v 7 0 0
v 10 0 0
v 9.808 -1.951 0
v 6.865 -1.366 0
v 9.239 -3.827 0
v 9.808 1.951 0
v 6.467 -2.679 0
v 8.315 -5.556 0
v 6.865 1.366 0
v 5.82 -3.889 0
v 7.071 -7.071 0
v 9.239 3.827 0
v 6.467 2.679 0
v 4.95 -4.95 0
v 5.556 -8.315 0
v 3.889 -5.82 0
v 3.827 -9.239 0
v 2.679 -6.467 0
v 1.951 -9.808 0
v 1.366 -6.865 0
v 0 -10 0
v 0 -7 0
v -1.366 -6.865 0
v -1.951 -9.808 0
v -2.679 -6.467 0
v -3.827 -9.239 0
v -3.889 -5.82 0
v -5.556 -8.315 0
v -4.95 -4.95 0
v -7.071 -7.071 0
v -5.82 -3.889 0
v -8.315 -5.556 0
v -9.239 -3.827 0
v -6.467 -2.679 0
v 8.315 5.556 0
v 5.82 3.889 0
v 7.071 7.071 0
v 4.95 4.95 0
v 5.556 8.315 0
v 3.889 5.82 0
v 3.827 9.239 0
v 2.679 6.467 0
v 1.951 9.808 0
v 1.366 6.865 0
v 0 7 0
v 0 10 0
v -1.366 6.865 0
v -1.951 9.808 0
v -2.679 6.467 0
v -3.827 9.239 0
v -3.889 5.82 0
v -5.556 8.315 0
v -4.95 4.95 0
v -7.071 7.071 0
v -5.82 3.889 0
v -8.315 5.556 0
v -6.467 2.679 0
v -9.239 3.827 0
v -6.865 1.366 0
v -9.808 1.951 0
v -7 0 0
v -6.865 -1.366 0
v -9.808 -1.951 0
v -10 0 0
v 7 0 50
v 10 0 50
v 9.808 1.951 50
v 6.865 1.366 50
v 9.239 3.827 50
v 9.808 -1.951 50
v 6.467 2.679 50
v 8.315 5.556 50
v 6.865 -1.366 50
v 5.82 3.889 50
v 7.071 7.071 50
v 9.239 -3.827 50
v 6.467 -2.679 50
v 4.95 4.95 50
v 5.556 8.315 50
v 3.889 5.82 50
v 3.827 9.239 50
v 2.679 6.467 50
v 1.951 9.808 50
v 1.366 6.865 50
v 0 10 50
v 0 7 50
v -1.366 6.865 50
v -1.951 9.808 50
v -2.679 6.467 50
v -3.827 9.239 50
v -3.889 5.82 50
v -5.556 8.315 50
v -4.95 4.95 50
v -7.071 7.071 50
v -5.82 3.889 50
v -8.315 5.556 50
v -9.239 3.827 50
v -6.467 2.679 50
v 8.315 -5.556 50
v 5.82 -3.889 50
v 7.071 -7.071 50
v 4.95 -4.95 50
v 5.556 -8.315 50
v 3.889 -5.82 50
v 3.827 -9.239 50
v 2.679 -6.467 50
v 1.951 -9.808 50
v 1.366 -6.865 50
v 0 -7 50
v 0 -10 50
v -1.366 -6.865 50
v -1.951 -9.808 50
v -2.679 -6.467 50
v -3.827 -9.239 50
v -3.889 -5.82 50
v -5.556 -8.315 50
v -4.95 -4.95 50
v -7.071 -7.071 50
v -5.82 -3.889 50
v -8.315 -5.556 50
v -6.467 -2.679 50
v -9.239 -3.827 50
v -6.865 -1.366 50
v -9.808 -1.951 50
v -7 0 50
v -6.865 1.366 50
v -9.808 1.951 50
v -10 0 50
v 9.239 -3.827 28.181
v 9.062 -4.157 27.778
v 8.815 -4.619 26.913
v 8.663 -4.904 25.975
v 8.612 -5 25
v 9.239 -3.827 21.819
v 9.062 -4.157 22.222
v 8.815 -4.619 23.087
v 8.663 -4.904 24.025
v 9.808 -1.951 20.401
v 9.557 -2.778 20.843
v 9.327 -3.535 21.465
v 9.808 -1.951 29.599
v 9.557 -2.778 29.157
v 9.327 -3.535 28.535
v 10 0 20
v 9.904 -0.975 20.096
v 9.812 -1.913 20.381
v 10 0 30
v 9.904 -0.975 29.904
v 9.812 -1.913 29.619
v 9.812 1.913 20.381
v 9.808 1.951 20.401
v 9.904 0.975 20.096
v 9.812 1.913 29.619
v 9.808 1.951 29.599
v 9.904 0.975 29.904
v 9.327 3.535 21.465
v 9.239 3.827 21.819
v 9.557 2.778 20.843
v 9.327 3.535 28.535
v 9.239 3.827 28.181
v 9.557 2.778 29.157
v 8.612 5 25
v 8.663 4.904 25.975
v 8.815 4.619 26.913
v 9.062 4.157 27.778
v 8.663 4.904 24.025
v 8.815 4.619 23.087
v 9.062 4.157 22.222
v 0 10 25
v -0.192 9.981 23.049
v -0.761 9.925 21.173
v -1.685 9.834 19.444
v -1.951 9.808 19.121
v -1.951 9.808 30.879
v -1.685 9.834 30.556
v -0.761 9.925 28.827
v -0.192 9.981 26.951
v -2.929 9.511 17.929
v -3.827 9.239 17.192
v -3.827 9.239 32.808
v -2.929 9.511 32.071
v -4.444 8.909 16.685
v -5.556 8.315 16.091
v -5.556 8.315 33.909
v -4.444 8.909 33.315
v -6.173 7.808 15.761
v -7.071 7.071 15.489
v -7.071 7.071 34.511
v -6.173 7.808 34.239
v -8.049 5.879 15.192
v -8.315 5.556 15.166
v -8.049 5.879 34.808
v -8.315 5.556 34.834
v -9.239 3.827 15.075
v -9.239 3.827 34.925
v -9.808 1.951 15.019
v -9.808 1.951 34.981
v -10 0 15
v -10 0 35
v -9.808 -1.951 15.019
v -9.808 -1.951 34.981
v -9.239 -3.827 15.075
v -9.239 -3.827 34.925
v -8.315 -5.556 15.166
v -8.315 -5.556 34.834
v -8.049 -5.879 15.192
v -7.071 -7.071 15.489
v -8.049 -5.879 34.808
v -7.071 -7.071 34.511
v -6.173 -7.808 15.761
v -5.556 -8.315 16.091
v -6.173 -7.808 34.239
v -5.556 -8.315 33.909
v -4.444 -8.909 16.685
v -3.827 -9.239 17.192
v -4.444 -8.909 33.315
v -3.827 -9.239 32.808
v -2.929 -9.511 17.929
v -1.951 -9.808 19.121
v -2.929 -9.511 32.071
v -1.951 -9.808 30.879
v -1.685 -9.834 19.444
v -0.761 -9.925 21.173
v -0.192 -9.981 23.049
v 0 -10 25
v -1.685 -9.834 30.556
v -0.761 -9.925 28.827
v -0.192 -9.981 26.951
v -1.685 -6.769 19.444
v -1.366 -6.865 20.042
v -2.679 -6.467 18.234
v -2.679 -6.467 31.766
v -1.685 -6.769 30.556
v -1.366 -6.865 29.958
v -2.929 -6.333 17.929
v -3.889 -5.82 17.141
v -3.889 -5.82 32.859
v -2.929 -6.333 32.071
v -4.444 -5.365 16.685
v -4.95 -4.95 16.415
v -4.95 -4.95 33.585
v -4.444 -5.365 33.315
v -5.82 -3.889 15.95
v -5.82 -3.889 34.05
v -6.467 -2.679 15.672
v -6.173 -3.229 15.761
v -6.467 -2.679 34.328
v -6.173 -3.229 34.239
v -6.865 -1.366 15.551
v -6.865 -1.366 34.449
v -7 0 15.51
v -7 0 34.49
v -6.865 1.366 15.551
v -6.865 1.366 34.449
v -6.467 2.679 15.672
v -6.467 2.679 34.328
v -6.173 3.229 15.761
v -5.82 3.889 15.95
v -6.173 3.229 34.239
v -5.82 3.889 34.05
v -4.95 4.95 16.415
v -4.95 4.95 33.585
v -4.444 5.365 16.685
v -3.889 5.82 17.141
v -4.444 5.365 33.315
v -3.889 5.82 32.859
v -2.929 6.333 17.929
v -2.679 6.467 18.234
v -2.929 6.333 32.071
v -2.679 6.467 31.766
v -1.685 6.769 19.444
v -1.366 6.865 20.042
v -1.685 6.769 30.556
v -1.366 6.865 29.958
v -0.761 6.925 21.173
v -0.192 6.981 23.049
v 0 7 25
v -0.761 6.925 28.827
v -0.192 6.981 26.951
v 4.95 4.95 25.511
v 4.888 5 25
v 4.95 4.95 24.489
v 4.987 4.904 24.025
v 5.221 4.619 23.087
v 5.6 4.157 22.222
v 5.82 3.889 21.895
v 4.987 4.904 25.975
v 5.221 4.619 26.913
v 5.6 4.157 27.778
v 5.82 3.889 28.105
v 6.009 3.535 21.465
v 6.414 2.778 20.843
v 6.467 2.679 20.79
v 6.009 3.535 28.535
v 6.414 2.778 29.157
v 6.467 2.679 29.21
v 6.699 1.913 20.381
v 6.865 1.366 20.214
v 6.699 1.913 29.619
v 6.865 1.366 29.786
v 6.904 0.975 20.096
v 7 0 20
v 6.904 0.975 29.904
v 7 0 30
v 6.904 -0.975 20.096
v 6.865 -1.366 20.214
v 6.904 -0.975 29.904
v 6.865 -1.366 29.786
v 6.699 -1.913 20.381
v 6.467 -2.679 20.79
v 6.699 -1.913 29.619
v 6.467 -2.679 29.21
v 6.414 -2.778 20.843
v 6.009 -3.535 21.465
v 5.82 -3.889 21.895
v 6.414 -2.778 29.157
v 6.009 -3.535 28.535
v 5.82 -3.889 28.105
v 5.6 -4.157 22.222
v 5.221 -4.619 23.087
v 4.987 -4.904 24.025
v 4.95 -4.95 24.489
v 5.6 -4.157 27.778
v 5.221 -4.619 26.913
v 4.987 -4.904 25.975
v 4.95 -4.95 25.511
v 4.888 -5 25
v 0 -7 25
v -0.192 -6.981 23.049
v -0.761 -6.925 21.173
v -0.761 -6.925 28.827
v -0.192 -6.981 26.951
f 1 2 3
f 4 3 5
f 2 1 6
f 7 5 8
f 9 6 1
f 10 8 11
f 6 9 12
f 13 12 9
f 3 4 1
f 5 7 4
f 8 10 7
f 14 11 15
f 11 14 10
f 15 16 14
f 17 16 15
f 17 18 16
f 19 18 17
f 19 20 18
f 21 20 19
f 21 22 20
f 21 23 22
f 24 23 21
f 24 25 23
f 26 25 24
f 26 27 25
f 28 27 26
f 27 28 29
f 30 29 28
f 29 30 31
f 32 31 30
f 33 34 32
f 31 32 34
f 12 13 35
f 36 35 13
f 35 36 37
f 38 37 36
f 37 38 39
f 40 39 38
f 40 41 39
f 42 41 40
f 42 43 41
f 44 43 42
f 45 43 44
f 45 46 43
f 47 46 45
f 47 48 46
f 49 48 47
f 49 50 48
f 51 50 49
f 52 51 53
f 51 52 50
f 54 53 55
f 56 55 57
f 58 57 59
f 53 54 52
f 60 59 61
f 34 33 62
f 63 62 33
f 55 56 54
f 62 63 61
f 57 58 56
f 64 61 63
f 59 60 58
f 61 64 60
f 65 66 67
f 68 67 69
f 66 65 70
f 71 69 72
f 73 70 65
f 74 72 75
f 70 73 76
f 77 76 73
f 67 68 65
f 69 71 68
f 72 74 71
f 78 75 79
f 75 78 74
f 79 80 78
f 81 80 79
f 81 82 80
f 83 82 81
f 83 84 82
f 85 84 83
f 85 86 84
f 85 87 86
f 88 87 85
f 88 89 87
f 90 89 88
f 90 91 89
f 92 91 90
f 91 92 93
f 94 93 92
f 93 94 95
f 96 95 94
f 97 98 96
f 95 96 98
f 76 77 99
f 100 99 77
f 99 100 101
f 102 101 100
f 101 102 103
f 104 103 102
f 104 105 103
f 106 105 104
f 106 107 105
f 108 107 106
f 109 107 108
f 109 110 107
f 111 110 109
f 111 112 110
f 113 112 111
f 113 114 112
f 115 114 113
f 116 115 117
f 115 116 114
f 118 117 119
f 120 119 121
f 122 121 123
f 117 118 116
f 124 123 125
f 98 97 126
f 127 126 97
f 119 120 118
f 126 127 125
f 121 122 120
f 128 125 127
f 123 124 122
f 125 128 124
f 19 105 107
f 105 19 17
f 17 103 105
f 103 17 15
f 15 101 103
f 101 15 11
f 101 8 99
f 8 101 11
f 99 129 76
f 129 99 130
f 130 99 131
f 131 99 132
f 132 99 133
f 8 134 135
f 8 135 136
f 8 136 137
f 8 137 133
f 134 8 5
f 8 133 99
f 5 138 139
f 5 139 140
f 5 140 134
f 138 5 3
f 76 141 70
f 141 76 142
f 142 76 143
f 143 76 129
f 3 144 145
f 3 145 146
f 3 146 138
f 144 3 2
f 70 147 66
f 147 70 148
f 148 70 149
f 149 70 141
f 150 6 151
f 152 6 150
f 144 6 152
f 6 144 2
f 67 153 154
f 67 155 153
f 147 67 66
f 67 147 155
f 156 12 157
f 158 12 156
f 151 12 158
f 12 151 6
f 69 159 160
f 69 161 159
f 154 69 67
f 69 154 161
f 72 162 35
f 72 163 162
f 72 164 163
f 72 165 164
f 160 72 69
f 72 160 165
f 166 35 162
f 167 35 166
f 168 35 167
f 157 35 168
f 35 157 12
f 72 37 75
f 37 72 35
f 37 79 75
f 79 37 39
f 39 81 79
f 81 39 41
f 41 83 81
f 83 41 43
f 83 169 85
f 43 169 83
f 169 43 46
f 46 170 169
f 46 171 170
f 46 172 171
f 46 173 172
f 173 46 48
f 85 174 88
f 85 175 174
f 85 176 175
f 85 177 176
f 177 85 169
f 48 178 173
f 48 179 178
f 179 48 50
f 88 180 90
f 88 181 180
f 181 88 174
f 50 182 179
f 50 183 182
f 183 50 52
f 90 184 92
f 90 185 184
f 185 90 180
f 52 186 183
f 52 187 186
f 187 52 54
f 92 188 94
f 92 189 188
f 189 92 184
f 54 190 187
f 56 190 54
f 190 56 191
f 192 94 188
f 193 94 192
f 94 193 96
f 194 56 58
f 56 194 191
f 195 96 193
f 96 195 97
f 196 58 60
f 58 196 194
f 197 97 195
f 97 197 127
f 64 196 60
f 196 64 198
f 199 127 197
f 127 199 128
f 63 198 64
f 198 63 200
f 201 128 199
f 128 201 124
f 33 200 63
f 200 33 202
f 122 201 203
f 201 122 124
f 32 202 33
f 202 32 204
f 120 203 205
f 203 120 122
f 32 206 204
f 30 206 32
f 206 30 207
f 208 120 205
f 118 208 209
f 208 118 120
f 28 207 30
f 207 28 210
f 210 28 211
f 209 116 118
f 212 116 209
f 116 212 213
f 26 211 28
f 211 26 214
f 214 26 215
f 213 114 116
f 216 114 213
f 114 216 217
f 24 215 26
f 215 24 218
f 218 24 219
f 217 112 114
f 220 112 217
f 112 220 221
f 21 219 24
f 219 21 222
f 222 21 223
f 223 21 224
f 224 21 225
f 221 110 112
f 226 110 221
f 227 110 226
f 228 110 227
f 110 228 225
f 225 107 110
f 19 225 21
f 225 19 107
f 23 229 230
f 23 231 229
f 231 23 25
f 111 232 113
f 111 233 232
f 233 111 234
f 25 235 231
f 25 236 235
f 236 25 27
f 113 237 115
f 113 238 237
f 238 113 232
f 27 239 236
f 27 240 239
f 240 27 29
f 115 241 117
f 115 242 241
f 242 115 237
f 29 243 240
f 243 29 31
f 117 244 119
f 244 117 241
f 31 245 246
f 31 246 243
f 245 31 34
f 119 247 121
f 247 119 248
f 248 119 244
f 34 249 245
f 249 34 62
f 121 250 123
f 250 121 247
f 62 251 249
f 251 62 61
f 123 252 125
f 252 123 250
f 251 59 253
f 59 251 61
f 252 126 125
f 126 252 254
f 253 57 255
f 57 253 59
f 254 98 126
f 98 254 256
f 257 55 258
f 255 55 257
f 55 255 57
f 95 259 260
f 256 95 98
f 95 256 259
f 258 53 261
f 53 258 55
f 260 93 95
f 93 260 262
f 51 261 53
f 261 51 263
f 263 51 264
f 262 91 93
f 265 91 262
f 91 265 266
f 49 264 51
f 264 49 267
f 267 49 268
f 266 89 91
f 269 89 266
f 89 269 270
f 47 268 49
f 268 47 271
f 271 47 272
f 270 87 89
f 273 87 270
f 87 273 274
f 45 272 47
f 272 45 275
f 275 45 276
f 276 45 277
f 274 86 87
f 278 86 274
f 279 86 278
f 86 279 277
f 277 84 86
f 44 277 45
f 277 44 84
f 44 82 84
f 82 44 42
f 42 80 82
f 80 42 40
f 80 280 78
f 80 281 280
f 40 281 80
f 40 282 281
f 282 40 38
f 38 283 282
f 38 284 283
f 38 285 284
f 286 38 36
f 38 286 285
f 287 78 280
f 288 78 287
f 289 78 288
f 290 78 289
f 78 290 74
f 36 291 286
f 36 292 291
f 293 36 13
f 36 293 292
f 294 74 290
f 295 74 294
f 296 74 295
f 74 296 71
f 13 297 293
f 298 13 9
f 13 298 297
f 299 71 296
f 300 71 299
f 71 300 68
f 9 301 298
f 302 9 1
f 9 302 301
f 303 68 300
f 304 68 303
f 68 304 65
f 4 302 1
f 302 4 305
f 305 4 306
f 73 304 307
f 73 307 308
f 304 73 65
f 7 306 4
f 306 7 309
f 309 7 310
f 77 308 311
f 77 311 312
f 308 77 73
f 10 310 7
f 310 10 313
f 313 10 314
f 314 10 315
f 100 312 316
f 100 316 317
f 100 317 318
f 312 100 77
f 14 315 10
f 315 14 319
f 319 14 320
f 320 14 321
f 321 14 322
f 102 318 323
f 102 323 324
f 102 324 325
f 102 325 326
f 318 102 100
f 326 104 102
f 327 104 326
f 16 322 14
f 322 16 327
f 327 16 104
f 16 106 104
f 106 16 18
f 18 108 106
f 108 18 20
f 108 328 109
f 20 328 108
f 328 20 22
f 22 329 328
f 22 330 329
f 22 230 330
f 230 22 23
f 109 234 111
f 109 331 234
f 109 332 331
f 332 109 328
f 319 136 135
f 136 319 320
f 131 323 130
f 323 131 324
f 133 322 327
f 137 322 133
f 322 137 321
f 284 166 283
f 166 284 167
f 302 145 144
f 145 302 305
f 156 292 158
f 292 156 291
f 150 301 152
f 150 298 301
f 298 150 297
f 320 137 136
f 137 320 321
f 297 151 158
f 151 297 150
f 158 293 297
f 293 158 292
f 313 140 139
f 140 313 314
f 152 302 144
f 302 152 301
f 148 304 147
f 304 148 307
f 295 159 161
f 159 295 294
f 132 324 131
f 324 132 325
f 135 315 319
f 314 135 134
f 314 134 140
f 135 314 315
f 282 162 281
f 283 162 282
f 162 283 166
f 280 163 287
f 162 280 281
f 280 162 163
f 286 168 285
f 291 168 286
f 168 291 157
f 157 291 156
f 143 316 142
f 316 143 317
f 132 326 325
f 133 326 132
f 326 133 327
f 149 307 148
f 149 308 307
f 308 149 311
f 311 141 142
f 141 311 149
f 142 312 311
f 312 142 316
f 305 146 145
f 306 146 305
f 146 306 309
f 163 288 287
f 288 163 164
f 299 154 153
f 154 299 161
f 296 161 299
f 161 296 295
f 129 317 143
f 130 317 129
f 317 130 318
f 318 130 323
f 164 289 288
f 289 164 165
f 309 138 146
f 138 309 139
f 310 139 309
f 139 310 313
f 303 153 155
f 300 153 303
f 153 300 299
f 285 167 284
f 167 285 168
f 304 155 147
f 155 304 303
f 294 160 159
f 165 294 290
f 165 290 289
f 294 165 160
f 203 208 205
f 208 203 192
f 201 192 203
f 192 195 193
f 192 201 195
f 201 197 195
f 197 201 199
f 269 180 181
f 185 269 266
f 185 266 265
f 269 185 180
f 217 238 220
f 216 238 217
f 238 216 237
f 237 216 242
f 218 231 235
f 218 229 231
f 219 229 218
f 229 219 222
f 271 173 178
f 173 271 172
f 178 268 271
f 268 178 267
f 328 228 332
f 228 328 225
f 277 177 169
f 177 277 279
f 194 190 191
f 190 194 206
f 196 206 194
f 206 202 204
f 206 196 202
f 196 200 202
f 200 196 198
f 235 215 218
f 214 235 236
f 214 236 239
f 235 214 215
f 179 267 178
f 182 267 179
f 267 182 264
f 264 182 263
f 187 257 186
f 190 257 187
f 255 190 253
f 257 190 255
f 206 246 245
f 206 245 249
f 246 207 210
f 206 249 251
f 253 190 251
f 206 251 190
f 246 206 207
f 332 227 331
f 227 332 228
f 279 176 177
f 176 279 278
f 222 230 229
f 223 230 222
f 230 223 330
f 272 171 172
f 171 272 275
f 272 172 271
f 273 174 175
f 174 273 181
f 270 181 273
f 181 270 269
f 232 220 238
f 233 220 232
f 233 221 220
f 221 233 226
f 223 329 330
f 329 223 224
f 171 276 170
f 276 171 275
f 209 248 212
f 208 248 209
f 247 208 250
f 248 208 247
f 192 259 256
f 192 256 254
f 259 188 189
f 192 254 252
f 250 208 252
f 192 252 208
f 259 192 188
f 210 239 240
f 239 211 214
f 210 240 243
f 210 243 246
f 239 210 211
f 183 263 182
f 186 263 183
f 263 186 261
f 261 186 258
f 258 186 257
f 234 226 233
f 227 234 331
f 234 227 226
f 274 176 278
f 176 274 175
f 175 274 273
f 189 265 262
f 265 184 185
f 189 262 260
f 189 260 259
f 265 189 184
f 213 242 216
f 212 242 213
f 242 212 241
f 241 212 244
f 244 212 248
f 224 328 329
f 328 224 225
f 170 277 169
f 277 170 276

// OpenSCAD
// Generated by Parametrix
ca_armAxis_faceAxis_000 = [ [ 10.0000, 0.0000 ],[ 9.8079, 1.9509 ],[ 9.2388, 3.8268 ],[ 8.3147, 5.5557 ],[ 7.0711, 7.0711 ],[ 5.5557, 8.3147 ],[ 3.8268, 9.2388 ],[ 1.9509, 9.8079 ],[ 0.0000, 10.0000 ],[ -1.9509, 9.8079 ],[ -3.8268, 9.2388 ],[ -5.5557, 8.3147 ],[ -7.0711, 7.0711 ],[ -8.3147, 5.5557 ],[ -9.2388, 3.8268 ],[ -9.8079, 1.9509 ],[ -10.0000, 0.0000 ],[ -9.8079, -1.9509 ],[ -9.2388, -3.8268 ],[ -8.3147, -5.5557 ],[ -7.0711, -7.0711 ],[ -5.5557, -8.3147 ],[ -3.8268, -9.2388 ],[ -1.9509, -9.8079 ],[ -0.0000, -10.0000 ],[ 1.9509, -9.8079 ],[ 3.8268, -9.2388 ],[ 5.5557, -8.3147 ],[ 7.0711, -7.0711 ],[ 8.3147, -5.5557 ],[ 9.2388, -3.8268 ],[ 9.8079, -1.9509 ],[ 10.0000, 0.0000 ] ];
cb_armAxis_faceAxis_000 = [  0, 1, 2, 3, 4, 5, 6, 7, 8, 9, 10, 11, 12, 13, 14, 15, 16, 17, 18, 19, 20, 21, 22, 23, 24, 25, 26, 27, 28, 29, 30, 31, 32 ];
ca_armAxis_faceAxis_001 = [ [ 7.0000, 0.0000 ],[ 6.8655, 1.3656 ],[ 6.4672, 2.6788 ],[ 5.8203, 3.8890 ],[ 4.9497, 4.9497 ],[ 3.8890, 5.8203 ],[ 2.6788, 6.4672 ],[ 1.3656, 6.8655 ],[ 0.0000, 7.0000 ],[ -1.3656, 6.8655 ],[ -2.6788, 6.4672 ],[ -3.8890, 5.8203 ],[ -4.9497, 4.9497 ],[ -5.8203, 3.8890 ],[ -6.4672, 2.6788 ],[ -6.8655, 1.3656 ],[ -7.0000, 0.0000 ],[ -6.8655, -1.3656 ],[ -6.4672, -2.6788 ],[ -5.8203, -3.8890 ],[ -4.9497, -4.9497 ],[ -3.8890, -5.8203 ],[ -2.6788, -6.4672 ],[ -1.3656, -6.8655 ],[ -0.0000, -7.0000 ],[ 1.3656, -6.8655 ],[ 2.6788, -6.4672 ],[ 3.8890, -5.8203 ],[ 4.9497, -4.9497 ],[ 5.8203, -3.8890 ],[ 6.4672, -2.6788 ],[ 6.8655, -1.3656 ],[ 7.0000, 0.0000 ] ];
cb_armAxis_faceAxis_001 = [  33, 34, 35, 36, 37, 38, 39, 40, 41, 42, 43, 44, 45, 46, 47, 48, 49, 50, 51, 52, 53, 54, 55, 56, 57, 58, 59, 60, 61, 62, 63, 64, 65 ];
a_armAxis_faceAxis = concat(ca_armAxis_faceAxis_000, ca_armAxis_faceAxis_001);
b_armAxis_faceAxis = [cb_armAxis_faceAxis_000, cb_armAxis_faceAxis_001];
ca_armAxis_faceHoleS_000 = [ [ 5.0000, 0.0000 ],[ 4.9039, 0.9755 ],[ 4.6194, 1.9134 ],[ 4.1573, 2.7779 ],[ 3.5355, 3.5355 ],[ 2.7779, 4.1573 ],[ 1.9134, 4.6194 ],[ 0.9755, 4.9039 ],[ 0.0000, 5.0000 ],[ -0.9755, 4.9039 ],[ -1.9134, 4.6194 ],[ -2.7779, 4.1573 ],[ -3.5355, 3.5355 ],[ -4.1573, 2.7779 ],[ -4.6194, 1.9134 ],[ -4.9039, 0.9755 ],[ -5.0000, 0.0000 ],[ -4.9039, -0.9755 ],[ -4.6194, -1.9134 ],[ -4.1573, -2.7779 ],[ -3.5355, -3.5355 ],[ -2.7779, -4.1573 ],[ -1.9134, -4.6194 ],[ -0.9755, -4.9039 ],[ -0.0000, -5.0000 ],[ 0.9755, -4.9039 ],[ 1.9134, -4.6194 ],[ 2.7779, -4.1573 ],[ 3.5355, -3.5355 ],[ 4.1573, -2.7779 ],[ 4.6194, -1.9134 ],[ 4.9039, -0.9755 ],[ 5.0000, 0.0000 ] ];
cb_armAxis_faceHoleS_000 = [  0, 1, 2, 3, 4, 5, 6, 7, 8, 9, 10, 11, 12, 13, 14, 15, 16, 17, 18, 19, 20, 21, 22, 23, 24, 25, 26, 27, 28, 29, 30, 31, 32 ];
a_armAxis_faceHoleS = concat(ca_armAxis_faceHoleS_000);
b_armAxis_faceHoleS = [cb_armAxis_faceHoleS_000];
ca_armAxis_faceHoleL_000 = [ [ 10.0000, 0.0000 ],[ 9.8079, 1.9509 ],[ 9.2388, 3.8268 ],[ 8.3147, 5.5557 ],[ 7.0711, 7.0711 ],[ 5.5557, 8.3147 ],[ 3.8268, 9.2388 ],[ 1.9509, 9.8079 ],[ 0.0000, 10.0000 ],[ -1.9509, 9.8079 ],[ -3.8268, 9.2388 ],[ -5.5557, 8.3147 ],[ -7.0711, 7.0711 ],[ -8.3147, 5.5557 ],[ -9.2388, 3.8268 ],[ -9.8079, 1.9509 ],[ -10.0000, 0.0000 ],[ -9.8079, -1.9509 ],[ -9.2388, -3.8268 ],[ -8.3147, -5.5557 ],[ -7.0711, -7.0711 ],[ -5.5557, -8.3147 ],[ -3.8268, -9.2388 ],[ -1.9509, -9.8079 ],[ -0.0000, -10.0000 ],[ 1.9509, -9.8079 ],[ 3.8268, -9.2388 ],[ 5.5557, -8.3147 ],[ 7.0711, -7.0711 ],[ 8.3147, -5.5557 ],[ 9.2388, -3.8268 ],[ 9.8079, -1.9509 ],[ 10.0000, 0.0000 ] ];
cb_armAxis_faceHoleL_000 = [  0, 1, 2, 3, 4, 5, 6, 7, 8, 9, 10, 11, 12, 13, 14, 15, 16, 17, 18, 19, 20, 21, 22, 23, 24, 25, 26, 27, 28, 29, 30, 31, 32 ];
a_armAxis_faceHoleL = concat(ca_armAxis_faceHoleL_000);
b_armAxis_faceHoleL = [cb_armAxis_faceHoleL_000];

module subpax_armAxis_Axis () {
	translate( [ 0, 0, 0 ])
		rotate( [ 0, 0, 0 ])
			   linear_extrude(height = 50) polygon(a_armAxis_faceAxis, b_armAxis_faceAxis);
}

module subpax_armAxis_HoleS () {
	translate( [ 0, 0, 25 ])
		rotate( [ 0, 90, 0 ])
			   linear_extrude(height = 40) polygon(a_armAxis_faceHoleS, b_armAxis_faceHoleS);
}

module subpax_armAxis_HoleL () {
	translate( [ -10, -20, 25 ])
		rotate( [ -90, 0, 0 ])
			   linear_extrude(height = 40) polygon(a_armAxis_faceHoleL, b_armAxis_faceHoleL);
}

module pax_armAxis () {
	difference () {
		subpax_armAxis_Axis();
subpax_armAxis_HoleS();
subpax_armAxis_HoleL();
	}
}

pax_armAxis();
